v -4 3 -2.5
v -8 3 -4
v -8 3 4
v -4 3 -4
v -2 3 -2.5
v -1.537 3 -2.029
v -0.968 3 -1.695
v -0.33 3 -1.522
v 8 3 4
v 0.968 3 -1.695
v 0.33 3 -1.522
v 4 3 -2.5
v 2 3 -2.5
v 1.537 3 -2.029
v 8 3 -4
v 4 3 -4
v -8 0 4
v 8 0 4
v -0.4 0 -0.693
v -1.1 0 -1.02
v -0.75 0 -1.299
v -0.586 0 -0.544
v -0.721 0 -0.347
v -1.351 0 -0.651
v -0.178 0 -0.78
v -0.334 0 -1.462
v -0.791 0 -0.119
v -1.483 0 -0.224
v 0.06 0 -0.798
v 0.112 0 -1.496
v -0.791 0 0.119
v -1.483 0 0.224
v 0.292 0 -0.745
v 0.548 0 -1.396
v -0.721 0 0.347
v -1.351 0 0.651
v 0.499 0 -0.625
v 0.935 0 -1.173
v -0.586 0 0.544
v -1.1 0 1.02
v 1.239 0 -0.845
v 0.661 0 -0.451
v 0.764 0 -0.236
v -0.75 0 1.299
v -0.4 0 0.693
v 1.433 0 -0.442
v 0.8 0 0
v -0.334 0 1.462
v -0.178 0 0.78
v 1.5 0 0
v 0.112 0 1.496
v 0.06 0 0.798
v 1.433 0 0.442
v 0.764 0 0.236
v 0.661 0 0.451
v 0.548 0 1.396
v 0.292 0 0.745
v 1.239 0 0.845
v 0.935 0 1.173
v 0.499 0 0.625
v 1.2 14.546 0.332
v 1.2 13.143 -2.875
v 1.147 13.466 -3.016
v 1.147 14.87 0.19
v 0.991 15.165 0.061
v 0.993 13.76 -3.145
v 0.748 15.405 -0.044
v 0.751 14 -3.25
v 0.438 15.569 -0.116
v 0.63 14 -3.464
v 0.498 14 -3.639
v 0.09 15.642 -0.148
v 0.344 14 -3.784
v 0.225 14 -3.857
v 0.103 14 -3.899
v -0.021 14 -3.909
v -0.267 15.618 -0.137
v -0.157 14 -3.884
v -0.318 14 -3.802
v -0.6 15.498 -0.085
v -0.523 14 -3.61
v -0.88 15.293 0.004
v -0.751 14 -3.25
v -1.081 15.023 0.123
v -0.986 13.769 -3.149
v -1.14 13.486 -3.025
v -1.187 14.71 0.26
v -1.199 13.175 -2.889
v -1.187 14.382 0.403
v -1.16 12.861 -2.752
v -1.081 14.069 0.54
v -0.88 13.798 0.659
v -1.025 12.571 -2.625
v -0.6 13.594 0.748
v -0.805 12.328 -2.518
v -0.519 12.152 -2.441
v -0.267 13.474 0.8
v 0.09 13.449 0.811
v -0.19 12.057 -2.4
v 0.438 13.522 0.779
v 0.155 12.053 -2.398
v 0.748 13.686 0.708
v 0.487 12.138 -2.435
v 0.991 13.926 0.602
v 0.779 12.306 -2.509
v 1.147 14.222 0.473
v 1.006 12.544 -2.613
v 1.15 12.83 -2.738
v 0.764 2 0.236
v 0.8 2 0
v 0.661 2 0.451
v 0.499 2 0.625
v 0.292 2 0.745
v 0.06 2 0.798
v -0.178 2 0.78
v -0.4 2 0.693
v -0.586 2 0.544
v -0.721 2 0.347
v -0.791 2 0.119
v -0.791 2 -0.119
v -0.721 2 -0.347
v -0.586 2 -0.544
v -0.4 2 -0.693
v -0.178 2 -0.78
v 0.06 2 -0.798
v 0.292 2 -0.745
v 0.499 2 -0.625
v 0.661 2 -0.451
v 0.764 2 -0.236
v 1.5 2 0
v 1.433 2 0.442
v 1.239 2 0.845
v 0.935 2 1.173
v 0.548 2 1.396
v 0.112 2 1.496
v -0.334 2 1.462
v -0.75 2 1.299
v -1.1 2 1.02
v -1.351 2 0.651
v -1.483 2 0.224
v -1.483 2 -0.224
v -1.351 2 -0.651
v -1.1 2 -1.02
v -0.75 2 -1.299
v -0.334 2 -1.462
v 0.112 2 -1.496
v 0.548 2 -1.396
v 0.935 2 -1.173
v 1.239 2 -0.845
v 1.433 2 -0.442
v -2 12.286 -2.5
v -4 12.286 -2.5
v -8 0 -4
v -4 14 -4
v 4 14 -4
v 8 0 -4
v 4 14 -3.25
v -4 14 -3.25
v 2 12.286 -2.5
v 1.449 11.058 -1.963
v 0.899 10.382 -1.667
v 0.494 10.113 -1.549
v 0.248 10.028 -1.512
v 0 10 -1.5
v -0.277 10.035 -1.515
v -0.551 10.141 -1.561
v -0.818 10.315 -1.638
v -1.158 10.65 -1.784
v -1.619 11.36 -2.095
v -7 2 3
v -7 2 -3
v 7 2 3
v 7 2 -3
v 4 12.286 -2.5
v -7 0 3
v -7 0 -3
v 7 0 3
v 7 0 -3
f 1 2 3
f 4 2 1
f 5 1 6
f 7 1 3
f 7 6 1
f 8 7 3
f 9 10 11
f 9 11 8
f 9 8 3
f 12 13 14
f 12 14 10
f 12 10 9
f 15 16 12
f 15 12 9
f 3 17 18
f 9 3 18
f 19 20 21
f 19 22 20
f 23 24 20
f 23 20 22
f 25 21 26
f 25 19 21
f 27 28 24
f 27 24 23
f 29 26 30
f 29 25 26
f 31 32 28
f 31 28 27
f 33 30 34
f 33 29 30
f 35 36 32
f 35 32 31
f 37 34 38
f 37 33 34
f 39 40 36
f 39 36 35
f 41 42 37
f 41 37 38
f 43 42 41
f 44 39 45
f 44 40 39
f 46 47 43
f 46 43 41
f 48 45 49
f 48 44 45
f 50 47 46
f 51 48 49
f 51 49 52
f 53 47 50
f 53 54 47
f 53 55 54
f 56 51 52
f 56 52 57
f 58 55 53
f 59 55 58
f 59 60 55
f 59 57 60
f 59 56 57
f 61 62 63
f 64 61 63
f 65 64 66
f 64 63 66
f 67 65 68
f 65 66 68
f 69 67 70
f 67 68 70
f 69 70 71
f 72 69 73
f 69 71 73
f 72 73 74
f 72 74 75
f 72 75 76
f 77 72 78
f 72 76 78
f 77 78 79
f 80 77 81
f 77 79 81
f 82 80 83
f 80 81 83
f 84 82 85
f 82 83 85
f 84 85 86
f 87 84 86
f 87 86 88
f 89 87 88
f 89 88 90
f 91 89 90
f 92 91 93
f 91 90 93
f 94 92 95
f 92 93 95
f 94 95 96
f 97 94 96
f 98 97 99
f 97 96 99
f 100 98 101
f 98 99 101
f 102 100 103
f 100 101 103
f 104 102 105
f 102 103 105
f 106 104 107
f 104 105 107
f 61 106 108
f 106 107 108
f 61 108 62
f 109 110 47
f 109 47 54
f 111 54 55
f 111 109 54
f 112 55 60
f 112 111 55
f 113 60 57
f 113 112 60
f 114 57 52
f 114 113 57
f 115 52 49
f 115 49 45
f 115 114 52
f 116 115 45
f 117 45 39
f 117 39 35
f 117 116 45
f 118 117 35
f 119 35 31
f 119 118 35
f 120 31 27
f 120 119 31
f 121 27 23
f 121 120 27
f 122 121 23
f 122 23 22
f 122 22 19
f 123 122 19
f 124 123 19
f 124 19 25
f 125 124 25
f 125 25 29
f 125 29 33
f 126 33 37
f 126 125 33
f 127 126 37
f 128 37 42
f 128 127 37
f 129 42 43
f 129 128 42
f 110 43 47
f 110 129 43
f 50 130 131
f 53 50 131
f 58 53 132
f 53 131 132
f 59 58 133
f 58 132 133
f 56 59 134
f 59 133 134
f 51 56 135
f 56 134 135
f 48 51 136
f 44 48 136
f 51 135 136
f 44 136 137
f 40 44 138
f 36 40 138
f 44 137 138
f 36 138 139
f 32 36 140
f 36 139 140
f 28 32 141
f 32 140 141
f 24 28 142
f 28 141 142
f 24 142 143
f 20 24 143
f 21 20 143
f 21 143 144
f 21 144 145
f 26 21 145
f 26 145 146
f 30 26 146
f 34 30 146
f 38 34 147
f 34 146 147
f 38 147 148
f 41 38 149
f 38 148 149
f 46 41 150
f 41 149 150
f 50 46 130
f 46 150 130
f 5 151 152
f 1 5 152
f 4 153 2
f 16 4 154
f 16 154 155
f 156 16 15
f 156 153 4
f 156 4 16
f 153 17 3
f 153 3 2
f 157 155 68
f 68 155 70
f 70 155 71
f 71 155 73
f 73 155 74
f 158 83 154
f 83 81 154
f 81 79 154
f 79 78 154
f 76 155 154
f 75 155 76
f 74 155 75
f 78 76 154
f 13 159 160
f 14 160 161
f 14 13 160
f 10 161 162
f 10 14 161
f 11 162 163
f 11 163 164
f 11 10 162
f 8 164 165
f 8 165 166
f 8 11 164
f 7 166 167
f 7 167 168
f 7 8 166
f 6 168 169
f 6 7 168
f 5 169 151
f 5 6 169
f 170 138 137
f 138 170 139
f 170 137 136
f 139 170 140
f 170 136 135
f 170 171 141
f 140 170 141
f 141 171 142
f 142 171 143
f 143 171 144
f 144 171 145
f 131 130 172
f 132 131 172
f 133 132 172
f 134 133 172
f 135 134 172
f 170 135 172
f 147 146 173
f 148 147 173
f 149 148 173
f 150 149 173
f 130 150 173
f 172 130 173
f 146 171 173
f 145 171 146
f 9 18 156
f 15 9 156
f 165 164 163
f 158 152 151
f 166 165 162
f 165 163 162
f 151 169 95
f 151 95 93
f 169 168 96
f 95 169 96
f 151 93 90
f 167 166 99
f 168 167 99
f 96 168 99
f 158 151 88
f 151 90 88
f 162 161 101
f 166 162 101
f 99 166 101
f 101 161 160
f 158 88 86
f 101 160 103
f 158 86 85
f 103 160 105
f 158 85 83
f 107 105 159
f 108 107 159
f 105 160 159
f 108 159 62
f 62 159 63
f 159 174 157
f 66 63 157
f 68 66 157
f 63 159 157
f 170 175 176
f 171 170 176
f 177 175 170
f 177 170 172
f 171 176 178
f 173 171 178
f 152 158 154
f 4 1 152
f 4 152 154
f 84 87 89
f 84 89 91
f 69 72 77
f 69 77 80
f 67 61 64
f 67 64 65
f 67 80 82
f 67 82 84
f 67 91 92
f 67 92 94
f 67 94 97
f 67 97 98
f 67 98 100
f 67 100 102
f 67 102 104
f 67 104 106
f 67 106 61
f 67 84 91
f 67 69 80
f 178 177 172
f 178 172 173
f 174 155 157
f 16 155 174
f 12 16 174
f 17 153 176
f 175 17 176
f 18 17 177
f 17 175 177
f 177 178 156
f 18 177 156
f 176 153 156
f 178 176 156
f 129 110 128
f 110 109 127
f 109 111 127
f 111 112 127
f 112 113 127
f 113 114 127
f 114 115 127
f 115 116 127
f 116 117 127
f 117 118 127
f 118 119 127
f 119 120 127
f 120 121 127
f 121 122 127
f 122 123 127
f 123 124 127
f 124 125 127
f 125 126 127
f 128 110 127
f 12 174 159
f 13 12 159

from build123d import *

# Parameters (mm, degrees)
SKETCH1_W                       = 16
SKETCH1_H                       = 8
BOSS_EXTRUDE1_DEPTH             = 3
SHELL1_T                        = -1
SKETCH2_R                       = 1.5
SKETCH2_R_2                     = 0.8
BOSS_EXTRUDE2_DEPTH             = 2
BOSS_EXTRUDE3_DEPTH             = 11
CUT_EXTRUDE1_DEPTH              = 19.867962264
BOSS_EXTRUDE4_REACH             = 18.513
SKETCH5_R                       = 1.2
BOSS_EXTRUDE4_DIRECTION_2_DEPTH = 3.5


with BuildPart() as part:
    # Sketch1 → Boss-Extrude1 (new body)
    with BuildSketch(Plane(origin=(0, 0, 0), x_dir=(1, 0, 0), z_dir=(0, 1, 0))):
        Rectangle(SKETCH1_W, SKETCH1_H)
    extrude(amount=BOSS_EXTRUDE1_DEPTH)

    # Shell1
    shell1_openings = [part.faces().sort_by_distance(p)[0] for p in [
        (0, 0, 0),
    ]]
    offset(amount=SHELL1_T, openings=shell1_openings, kind=Kind.INTERSECTION)

    # Sketch2 → Boss-Extrude2 (add)
    with BuildSketch(Plane.XZ.offset(-2)):
        Circle(SKETCH2_R)
        Circle(SKETCH2_R_2, mode=Mode.SUBTRACT)
    extrude(amount=BOSS_EXTRUDE2_DEPTH)

    # Sketch3 → Boss-Extrude3 (add)
    with BuildSketch(Plane(origin=(0, 3, 0), x_dir=(1, 0, 0), z_dir=(0, 1, 0))):
        with BuildLine():
            Line((-4, 4), (4, 4))
            Line((4, 4), (4, 2.5))
            Line((4, 2.5), (2, 2.5))
            ThreePointArc((2, 2.5), (0, 1.5), (-2, 2.5))
            Line((-2, 2.5), (-4, 2.5))
            Line((-4, 2.5), (-4, 4))
        make_face()
    extrude(amount=BOSS_EXTRUDE3_DEPTH)

    # Sketch4 → Cut-Extrude1 (cut, through all)
    with BuildSketch(Plane(origin=(4, 0, 0), x_dir=(0, 0, -1), z_dir=(1, 0, 0))):
        Polygon((3.25, 14), (1.5, 14), (1.5, 10), align=None)
    extrude(amount=-CUT_EXTRUDE1_DEPTH, mode=Mode.SUBTRACT)

    # Sketch5 → Boss-Extrude4 (add, up to next)
    with BuildSketch(Plane(origin=(0, 1.055737705, 2.413114754), x_dir=(1, 0, 0), z_dir=(0, 0.40081883401970764, 0.9161573349021892)), mode=Mode.PRIVATE) as boss_extrude4_sk1:
        with Locations((0, 13.193279121)):
            Circle(SKETCH5_R)
    boss_extrude4_tool1 = extrude(boss_extrude4_sk1.sketch, amount=-BOSS_EXTRUDE4_REACH, mode=Mode.PRIVATE) - part.part
    add(boss_extrude4_tool1.solids().sort_by_distance((0, 13.142857, -2.875))[0])

    # Sketch5 → Boss-Extrude4 direction 2 (add)
    with BuildSketch(Plane(origin=(0, 1.055737705, 2.413114754), x_dir=(1, 0, 0), z_dir=(0, 0.40081883401970764, 0.9161573349021892))):
        with Locations((0, 13.193279121)):
            Circle(SKETCH5_R)
    extrude(amount=BOSS_EXTRUDE4_DIRECTION_2_DEPTH)


solid = part.part
